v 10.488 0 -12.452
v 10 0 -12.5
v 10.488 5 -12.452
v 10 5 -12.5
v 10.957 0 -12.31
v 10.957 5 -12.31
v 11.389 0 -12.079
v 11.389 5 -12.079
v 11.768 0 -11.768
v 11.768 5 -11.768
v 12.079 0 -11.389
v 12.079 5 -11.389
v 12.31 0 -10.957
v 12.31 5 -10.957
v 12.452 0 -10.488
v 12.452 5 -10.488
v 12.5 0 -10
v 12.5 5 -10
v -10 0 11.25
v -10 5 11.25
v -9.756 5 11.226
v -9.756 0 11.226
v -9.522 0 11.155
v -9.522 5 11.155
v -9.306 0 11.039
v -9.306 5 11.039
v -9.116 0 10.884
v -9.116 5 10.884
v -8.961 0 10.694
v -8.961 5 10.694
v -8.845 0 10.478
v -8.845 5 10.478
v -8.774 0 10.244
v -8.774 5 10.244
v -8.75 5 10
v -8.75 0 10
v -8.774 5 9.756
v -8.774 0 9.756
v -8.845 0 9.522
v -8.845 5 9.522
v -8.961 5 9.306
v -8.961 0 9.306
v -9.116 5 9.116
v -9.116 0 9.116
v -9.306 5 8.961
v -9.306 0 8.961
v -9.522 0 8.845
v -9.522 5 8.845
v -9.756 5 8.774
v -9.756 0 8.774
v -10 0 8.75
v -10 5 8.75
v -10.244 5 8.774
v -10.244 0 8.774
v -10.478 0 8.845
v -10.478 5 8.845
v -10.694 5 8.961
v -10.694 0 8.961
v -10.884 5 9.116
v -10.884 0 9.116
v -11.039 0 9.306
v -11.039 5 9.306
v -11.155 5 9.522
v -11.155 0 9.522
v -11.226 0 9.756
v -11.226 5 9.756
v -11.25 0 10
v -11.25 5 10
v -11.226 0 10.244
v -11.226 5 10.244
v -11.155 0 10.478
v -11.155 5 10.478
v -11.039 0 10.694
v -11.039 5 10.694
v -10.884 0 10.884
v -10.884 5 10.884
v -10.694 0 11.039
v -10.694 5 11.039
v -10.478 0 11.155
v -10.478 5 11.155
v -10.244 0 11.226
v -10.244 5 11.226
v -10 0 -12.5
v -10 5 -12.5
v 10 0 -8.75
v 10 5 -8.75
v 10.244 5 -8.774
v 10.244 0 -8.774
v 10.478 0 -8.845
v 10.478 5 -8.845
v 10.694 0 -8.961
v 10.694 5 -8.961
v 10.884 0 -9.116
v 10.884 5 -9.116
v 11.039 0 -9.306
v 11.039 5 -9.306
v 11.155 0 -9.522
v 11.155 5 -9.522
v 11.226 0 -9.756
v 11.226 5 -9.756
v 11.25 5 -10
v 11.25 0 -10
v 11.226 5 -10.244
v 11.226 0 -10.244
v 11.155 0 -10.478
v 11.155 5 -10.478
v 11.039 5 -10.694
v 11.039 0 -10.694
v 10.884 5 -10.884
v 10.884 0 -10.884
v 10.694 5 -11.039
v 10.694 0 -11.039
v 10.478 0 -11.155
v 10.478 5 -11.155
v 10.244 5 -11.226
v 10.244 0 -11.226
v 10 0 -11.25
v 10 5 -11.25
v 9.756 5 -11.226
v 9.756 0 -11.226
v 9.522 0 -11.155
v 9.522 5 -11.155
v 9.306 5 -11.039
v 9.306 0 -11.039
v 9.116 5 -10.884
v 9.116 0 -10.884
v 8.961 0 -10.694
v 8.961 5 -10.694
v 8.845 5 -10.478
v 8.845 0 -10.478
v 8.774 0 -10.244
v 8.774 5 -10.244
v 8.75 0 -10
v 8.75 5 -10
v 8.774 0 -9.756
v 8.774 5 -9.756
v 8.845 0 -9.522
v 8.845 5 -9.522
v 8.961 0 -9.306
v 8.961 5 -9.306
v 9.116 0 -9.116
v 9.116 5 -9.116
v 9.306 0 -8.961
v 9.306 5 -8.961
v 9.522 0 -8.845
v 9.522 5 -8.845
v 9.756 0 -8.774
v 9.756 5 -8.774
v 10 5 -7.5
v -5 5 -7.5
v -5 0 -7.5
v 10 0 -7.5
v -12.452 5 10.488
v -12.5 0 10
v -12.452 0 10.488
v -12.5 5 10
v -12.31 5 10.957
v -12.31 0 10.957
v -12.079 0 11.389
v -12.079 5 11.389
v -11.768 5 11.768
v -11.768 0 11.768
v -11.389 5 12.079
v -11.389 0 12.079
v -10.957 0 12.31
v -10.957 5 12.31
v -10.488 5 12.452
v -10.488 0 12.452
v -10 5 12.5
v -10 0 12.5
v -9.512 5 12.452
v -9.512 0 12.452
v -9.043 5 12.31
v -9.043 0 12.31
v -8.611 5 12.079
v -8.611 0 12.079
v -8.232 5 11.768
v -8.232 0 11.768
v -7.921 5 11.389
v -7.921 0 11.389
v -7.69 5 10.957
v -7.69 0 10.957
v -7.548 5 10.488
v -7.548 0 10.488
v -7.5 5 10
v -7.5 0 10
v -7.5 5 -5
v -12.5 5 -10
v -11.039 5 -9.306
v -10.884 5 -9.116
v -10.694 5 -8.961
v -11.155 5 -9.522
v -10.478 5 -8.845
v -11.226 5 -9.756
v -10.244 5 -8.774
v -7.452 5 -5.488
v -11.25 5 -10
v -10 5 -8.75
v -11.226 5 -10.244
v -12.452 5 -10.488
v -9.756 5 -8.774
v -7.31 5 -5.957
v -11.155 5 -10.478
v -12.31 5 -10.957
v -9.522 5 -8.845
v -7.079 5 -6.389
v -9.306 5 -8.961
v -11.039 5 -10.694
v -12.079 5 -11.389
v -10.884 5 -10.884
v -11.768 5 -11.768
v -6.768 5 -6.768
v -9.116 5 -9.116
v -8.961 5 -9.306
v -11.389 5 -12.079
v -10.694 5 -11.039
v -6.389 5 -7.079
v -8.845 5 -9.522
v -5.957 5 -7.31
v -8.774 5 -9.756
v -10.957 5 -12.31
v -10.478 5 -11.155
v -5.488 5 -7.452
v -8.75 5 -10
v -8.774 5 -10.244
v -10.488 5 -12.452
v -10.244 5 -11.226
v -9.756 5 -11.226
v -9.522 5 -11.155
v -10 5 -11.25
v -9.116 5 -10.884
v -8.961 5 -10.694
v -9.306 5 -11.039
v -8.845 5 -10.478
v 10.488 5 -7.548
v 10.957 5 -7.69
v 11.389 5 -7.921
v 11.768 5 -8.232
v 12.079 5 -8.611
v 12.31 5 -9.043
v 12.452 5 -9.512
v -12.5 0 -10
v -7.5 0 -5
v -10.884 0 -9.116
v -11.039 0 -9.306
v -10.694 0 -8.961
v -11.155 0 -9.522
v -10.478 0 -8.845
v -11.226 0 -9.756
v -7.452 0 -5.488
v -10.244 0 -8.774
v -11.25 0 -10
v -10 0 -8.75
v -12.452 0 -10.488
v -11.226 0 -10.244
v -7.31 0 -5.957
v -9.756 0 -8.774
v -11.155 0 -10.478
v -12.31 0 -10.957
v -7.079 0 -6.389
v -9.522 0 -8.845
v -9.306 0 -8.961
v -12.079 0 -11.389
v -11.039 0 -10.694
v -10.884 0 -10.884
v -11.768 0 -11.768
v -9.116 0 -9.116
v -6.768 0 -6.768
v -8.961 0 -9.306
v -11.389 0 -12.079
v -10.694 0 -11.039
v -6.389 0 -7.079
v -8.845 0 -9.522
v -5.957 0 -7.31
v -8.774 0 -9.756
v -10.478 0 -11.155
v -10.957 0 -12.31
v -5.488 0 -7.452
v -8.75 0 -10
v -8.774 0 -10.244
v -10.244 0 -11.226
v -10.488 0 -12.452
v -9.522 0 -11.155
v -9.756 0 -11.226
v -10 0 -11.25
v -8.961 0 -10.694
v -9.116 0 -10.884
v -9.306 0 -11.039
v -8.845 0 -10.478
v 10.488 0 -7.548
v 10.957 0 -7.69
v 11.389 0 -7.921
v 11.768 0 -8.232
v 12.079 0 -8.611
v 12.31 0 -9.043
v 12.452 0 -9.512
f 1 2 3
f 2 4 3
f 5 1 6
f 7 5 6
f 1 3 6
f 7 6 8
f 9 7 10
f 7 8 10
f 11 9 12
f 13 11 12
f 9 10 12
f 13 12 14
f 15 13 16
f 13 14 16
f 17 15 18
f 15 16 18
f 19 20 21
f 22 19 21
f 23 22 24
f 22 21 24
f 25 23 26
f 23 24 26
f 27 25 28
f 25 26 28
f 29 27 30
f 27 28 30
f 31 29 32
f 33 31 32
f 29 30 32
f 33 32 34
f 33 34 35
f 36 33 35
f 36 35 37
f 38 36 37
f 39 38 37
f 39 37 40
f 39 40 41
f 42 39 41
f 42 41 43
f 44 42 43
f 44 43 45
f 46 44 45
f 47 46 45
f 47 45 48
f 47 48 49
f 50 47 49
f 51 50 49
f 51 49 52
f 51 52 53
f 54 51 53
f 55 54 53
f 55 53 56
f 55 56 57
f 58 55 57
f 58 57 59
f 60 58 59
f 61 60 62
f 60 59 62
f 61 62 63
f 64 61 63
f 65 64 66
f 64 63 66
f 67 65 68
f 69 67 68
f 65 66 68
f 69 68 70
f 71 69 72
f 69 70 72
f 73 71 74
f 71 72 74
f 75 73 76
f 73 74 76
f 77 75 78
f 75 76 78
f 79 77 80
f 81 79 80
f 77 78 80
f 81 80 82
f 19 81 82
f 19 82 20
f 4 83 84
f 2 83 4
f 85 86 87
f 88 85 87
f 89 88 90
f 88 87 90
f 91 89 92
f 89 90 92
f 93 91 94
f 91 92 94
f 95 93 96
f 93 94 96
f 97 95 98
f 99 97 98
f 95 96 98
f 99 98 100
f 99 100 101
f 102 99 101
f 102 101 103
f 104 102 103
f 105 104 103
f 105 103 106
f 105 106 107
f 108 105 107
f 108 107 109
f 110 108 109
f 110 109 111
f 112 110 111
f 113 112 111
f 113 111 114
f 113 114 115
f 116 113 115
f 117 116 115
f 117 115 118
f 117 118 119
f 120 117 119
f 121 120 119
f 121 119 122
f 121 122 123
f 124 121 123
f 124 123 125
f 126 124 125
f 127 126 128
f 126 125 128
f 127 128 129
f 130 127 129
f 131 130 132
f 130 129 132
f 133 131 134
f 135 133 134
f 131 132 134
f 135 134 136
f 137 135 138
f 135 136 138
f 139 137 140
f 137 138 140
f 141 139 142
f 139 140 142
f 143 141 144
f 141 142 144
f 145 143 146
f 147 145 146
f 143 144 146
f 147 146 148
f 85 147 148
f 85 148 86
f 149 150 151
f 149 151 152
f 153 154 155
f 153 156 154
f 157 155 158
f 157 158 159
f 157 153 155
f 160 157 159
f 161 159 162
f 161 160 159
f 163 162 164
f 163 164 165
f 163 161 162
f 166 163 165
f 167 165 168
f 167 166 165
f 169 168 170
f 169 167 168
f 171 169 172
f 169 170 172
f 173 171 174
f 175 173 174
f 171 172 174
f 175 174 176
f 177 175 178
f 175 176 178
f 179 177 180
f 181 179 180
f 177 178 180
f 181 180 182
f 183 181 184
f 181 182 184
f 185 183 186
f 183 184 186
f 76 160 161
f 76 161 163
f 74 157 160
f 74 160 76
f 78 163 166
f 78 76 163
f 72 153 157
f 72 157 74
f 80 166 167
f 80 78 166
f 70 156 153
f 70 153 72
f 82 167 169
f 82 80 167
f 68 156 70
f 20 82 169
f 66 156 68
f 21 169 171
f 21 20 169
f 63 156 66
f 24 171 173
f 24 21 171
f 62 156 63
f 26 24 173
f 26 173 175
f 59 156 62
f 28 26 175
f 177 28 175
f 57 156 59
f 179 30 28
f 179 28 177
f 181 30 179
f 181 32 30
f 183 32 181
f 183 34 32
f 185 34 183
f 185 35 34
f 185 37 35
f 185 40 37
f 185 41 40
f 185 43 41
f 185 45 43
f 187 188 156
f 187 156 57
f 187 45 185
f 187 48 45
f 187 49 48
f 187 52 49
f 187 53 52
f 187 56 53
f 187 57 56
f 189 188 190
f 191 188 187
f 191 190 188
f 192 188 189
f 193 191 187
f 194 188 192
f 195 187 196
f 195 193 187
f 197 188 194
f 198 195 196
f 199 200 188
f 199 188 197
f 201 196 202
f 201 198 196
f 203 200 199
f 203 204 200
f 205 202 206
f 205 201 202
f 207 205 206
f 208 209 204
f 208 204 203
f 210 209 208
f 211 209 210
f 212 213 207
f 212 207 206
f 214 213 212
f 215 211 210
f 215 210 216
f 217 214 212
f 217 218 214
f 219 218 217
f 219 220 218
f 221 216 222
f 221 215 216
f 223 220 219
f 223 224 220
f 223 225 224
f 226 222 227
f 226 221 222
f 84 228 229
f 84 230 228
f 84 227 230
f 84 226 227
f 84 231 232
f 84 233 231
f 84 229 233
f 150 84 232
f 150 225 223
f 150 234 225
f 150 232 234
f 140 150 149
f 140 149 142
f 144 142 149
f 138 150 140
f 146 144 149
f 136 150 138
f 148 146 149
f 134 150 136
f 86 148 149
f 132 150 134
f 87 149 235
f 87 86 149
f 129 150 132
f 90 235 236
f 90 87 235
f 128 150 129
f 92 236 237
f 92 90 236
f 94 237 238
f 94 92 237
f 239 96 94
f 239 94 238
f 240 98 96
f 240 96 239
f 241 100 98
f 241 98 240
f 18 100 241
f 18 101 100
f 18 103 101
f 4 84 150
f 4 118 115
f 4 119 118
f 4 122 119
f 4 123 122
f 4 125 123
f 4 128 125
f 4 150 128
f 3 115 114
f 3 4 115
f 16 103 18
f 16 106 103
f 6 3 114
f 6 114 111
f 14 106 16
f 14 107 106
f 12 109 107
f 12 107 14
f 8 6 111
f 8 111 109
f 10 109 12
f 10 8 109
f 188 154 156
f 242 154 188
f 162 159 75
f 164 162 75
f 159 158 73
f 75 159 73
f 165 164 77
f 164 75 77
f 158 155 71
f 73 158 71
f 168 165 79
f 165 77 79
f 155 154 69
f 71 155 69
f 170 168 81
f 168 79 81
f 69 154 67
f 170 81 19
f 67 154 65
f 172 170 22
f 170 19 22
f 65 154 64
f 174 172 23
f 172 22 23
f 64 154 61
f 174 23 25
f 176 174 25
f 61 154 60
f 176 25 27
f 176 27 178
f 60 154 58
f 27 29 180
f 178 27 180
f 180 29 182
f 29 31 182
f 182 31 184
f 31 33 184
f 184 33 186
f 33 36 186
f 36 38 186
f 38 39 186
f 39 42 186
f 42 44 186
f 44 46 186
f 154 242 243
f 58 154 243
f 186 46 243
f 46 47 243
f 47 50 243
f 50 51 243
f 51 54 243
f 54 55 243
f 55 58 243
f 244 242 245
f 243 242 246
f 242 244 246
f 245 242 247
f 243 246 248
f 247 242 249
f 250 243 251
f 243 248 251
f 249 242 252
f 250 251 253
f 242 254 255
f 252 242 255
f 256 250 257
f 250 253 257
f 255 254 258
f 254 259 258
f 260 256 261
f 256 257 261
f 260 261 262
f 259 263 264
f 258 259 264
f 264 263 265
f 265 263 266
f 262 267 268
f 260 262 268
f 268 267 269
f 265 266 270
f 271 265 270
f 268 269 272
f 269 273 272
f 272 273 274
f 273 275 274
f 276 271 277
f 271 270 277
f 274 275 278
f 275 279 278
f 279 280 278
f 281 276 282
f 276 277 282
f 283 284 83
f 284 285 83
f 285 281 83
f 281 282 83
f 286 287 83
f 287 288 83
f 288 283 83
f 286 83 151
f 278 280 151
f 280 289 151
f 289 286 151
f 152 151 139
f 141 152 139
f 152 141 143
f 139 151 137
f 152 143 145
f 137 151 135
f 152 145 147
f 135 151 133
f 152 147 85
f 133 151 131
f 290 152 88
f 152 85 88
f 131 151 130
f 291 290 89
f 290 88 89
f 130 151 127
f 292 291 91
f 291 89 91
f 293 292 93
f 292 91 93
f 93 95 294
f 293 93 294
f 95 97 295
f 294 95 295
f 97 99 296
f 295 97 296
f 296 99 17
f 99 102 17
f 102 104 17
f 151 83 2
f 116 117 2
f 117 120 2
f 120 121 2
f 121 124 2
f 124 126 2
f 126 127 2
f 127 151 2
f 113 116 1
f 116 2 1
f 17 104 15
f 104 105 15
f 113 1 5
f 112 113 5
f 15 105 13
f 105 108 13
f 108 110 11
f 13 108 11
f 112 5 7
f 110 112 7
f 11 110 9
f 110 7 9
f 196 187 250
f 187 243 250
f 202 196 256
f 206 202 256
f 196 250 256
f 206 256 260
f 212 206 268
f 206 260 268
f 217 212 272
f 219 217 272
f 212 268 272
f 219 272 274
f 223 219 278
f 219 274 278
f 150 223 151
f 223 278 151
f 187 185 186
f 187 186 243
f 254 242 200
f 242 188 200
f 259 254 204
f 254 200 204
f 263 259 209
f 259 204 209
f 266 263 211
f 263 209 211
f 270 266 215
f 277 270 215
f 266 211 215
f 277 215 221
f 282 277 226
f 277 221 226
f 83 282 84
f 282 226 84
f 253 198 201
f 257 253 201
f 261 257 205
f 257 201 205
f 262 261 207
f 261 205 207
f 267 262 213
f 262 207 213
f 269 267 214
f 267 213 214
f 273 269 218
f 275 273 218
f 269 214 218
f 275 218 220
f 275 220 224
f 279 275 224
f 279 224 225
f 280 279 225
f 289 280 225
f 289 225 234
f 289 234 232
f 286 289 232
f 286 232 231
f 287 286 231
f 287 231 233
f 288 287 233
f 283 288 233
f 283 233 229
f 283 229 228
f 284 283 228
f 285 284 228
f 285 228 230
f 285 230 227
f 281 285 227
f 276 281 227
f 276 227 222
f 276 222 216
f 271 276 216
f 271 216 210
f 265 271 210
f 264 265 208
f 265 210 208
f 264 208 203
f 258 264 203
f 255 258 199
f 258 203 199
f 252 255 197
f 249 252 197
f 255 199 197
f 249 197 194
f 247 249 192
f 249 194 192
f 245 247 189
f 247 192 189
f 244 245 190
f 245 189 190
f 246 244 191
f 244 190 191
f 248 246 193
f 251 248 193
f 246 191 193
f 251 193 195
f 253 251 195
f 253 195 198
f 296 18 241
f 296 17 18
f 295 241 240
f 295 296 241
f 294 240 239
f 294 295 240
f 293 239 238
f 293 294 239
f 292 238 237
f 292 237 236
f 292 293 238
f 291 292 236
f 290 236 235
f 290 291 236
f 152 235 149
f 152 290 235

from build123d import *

# Parameters (mm, degrees)
SKETCH1_W           = 25
SKETCH1_H           = 25
BOSS_EXTRUDE1_DEPTH = 5
SKETCH3_R           = 1.25
CUT_EXTRUDE1_DEPTH  = 19.371173071
SKETCH4_W           = 20
SKETCH4_H           = 20
CUT_EXTRUDE2_DEPTH  = 19.371173071
FILLET1_R           = 2.5


with BuildPart() as part:
    # Sketch1 → Boss-Extrude1 (new body)
    with BuildSketch(Plane(origin=(0, 0, 0), x_dir=(1, 0, 0), z_dir=(0, 1, 0))):
        Rectangle(SKETCH1_W, SKETCH1_H)
    extrude(amount=BOSS_EXTRUDE1_DEPTH)

    # Sketch3 → Cut-Extrude1 (cut, through all)
    with BuildSketch(Plane(origin=(0, 5, 0), x_dir=(1, 0, 0), z_dir=(0, 1, 0))):
        with Locations(Location((-10, 10, 0), (0, 0, 270))):
            Circle(SKETCH3_R)
        with Locations(Location((10, 10, 0), (0, 0, 270))):
            Circle(SKETCH3_R)
        with Locations(Location((-10, -10, 0), (0, 0, 270))):
            Circle(SKETCH3_R)
    extrude(amount=-CUT_EXTRUDE1_DEPTH, mode=Mode.SUBTRACT)

    # Sketch4 → Cut-Extrude2 (cut, through all)
    with BuildSketch(Plane(origin=(0, 5, 0), x_dir=(1, 0, 0), z_dir=(0, 1, 0))):
        with Locations((2.5, -2.5)):
            Rectangle(SKETCH4_W, SKETCH4_H)
    extrude(amount=-CUT_EXTRUDE2_DEPTH, mode=Mode.SUBTRACT)

    # Fillet1
    fillet1_edges = [part.edges().sort_by_distance(p)[0] for p in [
        (-12.5, 2.5, 12.5),
        (12.5, 2.5, -12.5),
        (-12.5, 2.5, -12.5),
        (12.5, 2.5, -7.5),
        (-7.5, 2.5, 12.5),
        (-7.5, 2.5, -7.5),
    ]]
    fillet(fillet1_edges, radius=FILLET1_R - 0.0001)  # a hair under: the kernel refuses the full size


solid = part.part
